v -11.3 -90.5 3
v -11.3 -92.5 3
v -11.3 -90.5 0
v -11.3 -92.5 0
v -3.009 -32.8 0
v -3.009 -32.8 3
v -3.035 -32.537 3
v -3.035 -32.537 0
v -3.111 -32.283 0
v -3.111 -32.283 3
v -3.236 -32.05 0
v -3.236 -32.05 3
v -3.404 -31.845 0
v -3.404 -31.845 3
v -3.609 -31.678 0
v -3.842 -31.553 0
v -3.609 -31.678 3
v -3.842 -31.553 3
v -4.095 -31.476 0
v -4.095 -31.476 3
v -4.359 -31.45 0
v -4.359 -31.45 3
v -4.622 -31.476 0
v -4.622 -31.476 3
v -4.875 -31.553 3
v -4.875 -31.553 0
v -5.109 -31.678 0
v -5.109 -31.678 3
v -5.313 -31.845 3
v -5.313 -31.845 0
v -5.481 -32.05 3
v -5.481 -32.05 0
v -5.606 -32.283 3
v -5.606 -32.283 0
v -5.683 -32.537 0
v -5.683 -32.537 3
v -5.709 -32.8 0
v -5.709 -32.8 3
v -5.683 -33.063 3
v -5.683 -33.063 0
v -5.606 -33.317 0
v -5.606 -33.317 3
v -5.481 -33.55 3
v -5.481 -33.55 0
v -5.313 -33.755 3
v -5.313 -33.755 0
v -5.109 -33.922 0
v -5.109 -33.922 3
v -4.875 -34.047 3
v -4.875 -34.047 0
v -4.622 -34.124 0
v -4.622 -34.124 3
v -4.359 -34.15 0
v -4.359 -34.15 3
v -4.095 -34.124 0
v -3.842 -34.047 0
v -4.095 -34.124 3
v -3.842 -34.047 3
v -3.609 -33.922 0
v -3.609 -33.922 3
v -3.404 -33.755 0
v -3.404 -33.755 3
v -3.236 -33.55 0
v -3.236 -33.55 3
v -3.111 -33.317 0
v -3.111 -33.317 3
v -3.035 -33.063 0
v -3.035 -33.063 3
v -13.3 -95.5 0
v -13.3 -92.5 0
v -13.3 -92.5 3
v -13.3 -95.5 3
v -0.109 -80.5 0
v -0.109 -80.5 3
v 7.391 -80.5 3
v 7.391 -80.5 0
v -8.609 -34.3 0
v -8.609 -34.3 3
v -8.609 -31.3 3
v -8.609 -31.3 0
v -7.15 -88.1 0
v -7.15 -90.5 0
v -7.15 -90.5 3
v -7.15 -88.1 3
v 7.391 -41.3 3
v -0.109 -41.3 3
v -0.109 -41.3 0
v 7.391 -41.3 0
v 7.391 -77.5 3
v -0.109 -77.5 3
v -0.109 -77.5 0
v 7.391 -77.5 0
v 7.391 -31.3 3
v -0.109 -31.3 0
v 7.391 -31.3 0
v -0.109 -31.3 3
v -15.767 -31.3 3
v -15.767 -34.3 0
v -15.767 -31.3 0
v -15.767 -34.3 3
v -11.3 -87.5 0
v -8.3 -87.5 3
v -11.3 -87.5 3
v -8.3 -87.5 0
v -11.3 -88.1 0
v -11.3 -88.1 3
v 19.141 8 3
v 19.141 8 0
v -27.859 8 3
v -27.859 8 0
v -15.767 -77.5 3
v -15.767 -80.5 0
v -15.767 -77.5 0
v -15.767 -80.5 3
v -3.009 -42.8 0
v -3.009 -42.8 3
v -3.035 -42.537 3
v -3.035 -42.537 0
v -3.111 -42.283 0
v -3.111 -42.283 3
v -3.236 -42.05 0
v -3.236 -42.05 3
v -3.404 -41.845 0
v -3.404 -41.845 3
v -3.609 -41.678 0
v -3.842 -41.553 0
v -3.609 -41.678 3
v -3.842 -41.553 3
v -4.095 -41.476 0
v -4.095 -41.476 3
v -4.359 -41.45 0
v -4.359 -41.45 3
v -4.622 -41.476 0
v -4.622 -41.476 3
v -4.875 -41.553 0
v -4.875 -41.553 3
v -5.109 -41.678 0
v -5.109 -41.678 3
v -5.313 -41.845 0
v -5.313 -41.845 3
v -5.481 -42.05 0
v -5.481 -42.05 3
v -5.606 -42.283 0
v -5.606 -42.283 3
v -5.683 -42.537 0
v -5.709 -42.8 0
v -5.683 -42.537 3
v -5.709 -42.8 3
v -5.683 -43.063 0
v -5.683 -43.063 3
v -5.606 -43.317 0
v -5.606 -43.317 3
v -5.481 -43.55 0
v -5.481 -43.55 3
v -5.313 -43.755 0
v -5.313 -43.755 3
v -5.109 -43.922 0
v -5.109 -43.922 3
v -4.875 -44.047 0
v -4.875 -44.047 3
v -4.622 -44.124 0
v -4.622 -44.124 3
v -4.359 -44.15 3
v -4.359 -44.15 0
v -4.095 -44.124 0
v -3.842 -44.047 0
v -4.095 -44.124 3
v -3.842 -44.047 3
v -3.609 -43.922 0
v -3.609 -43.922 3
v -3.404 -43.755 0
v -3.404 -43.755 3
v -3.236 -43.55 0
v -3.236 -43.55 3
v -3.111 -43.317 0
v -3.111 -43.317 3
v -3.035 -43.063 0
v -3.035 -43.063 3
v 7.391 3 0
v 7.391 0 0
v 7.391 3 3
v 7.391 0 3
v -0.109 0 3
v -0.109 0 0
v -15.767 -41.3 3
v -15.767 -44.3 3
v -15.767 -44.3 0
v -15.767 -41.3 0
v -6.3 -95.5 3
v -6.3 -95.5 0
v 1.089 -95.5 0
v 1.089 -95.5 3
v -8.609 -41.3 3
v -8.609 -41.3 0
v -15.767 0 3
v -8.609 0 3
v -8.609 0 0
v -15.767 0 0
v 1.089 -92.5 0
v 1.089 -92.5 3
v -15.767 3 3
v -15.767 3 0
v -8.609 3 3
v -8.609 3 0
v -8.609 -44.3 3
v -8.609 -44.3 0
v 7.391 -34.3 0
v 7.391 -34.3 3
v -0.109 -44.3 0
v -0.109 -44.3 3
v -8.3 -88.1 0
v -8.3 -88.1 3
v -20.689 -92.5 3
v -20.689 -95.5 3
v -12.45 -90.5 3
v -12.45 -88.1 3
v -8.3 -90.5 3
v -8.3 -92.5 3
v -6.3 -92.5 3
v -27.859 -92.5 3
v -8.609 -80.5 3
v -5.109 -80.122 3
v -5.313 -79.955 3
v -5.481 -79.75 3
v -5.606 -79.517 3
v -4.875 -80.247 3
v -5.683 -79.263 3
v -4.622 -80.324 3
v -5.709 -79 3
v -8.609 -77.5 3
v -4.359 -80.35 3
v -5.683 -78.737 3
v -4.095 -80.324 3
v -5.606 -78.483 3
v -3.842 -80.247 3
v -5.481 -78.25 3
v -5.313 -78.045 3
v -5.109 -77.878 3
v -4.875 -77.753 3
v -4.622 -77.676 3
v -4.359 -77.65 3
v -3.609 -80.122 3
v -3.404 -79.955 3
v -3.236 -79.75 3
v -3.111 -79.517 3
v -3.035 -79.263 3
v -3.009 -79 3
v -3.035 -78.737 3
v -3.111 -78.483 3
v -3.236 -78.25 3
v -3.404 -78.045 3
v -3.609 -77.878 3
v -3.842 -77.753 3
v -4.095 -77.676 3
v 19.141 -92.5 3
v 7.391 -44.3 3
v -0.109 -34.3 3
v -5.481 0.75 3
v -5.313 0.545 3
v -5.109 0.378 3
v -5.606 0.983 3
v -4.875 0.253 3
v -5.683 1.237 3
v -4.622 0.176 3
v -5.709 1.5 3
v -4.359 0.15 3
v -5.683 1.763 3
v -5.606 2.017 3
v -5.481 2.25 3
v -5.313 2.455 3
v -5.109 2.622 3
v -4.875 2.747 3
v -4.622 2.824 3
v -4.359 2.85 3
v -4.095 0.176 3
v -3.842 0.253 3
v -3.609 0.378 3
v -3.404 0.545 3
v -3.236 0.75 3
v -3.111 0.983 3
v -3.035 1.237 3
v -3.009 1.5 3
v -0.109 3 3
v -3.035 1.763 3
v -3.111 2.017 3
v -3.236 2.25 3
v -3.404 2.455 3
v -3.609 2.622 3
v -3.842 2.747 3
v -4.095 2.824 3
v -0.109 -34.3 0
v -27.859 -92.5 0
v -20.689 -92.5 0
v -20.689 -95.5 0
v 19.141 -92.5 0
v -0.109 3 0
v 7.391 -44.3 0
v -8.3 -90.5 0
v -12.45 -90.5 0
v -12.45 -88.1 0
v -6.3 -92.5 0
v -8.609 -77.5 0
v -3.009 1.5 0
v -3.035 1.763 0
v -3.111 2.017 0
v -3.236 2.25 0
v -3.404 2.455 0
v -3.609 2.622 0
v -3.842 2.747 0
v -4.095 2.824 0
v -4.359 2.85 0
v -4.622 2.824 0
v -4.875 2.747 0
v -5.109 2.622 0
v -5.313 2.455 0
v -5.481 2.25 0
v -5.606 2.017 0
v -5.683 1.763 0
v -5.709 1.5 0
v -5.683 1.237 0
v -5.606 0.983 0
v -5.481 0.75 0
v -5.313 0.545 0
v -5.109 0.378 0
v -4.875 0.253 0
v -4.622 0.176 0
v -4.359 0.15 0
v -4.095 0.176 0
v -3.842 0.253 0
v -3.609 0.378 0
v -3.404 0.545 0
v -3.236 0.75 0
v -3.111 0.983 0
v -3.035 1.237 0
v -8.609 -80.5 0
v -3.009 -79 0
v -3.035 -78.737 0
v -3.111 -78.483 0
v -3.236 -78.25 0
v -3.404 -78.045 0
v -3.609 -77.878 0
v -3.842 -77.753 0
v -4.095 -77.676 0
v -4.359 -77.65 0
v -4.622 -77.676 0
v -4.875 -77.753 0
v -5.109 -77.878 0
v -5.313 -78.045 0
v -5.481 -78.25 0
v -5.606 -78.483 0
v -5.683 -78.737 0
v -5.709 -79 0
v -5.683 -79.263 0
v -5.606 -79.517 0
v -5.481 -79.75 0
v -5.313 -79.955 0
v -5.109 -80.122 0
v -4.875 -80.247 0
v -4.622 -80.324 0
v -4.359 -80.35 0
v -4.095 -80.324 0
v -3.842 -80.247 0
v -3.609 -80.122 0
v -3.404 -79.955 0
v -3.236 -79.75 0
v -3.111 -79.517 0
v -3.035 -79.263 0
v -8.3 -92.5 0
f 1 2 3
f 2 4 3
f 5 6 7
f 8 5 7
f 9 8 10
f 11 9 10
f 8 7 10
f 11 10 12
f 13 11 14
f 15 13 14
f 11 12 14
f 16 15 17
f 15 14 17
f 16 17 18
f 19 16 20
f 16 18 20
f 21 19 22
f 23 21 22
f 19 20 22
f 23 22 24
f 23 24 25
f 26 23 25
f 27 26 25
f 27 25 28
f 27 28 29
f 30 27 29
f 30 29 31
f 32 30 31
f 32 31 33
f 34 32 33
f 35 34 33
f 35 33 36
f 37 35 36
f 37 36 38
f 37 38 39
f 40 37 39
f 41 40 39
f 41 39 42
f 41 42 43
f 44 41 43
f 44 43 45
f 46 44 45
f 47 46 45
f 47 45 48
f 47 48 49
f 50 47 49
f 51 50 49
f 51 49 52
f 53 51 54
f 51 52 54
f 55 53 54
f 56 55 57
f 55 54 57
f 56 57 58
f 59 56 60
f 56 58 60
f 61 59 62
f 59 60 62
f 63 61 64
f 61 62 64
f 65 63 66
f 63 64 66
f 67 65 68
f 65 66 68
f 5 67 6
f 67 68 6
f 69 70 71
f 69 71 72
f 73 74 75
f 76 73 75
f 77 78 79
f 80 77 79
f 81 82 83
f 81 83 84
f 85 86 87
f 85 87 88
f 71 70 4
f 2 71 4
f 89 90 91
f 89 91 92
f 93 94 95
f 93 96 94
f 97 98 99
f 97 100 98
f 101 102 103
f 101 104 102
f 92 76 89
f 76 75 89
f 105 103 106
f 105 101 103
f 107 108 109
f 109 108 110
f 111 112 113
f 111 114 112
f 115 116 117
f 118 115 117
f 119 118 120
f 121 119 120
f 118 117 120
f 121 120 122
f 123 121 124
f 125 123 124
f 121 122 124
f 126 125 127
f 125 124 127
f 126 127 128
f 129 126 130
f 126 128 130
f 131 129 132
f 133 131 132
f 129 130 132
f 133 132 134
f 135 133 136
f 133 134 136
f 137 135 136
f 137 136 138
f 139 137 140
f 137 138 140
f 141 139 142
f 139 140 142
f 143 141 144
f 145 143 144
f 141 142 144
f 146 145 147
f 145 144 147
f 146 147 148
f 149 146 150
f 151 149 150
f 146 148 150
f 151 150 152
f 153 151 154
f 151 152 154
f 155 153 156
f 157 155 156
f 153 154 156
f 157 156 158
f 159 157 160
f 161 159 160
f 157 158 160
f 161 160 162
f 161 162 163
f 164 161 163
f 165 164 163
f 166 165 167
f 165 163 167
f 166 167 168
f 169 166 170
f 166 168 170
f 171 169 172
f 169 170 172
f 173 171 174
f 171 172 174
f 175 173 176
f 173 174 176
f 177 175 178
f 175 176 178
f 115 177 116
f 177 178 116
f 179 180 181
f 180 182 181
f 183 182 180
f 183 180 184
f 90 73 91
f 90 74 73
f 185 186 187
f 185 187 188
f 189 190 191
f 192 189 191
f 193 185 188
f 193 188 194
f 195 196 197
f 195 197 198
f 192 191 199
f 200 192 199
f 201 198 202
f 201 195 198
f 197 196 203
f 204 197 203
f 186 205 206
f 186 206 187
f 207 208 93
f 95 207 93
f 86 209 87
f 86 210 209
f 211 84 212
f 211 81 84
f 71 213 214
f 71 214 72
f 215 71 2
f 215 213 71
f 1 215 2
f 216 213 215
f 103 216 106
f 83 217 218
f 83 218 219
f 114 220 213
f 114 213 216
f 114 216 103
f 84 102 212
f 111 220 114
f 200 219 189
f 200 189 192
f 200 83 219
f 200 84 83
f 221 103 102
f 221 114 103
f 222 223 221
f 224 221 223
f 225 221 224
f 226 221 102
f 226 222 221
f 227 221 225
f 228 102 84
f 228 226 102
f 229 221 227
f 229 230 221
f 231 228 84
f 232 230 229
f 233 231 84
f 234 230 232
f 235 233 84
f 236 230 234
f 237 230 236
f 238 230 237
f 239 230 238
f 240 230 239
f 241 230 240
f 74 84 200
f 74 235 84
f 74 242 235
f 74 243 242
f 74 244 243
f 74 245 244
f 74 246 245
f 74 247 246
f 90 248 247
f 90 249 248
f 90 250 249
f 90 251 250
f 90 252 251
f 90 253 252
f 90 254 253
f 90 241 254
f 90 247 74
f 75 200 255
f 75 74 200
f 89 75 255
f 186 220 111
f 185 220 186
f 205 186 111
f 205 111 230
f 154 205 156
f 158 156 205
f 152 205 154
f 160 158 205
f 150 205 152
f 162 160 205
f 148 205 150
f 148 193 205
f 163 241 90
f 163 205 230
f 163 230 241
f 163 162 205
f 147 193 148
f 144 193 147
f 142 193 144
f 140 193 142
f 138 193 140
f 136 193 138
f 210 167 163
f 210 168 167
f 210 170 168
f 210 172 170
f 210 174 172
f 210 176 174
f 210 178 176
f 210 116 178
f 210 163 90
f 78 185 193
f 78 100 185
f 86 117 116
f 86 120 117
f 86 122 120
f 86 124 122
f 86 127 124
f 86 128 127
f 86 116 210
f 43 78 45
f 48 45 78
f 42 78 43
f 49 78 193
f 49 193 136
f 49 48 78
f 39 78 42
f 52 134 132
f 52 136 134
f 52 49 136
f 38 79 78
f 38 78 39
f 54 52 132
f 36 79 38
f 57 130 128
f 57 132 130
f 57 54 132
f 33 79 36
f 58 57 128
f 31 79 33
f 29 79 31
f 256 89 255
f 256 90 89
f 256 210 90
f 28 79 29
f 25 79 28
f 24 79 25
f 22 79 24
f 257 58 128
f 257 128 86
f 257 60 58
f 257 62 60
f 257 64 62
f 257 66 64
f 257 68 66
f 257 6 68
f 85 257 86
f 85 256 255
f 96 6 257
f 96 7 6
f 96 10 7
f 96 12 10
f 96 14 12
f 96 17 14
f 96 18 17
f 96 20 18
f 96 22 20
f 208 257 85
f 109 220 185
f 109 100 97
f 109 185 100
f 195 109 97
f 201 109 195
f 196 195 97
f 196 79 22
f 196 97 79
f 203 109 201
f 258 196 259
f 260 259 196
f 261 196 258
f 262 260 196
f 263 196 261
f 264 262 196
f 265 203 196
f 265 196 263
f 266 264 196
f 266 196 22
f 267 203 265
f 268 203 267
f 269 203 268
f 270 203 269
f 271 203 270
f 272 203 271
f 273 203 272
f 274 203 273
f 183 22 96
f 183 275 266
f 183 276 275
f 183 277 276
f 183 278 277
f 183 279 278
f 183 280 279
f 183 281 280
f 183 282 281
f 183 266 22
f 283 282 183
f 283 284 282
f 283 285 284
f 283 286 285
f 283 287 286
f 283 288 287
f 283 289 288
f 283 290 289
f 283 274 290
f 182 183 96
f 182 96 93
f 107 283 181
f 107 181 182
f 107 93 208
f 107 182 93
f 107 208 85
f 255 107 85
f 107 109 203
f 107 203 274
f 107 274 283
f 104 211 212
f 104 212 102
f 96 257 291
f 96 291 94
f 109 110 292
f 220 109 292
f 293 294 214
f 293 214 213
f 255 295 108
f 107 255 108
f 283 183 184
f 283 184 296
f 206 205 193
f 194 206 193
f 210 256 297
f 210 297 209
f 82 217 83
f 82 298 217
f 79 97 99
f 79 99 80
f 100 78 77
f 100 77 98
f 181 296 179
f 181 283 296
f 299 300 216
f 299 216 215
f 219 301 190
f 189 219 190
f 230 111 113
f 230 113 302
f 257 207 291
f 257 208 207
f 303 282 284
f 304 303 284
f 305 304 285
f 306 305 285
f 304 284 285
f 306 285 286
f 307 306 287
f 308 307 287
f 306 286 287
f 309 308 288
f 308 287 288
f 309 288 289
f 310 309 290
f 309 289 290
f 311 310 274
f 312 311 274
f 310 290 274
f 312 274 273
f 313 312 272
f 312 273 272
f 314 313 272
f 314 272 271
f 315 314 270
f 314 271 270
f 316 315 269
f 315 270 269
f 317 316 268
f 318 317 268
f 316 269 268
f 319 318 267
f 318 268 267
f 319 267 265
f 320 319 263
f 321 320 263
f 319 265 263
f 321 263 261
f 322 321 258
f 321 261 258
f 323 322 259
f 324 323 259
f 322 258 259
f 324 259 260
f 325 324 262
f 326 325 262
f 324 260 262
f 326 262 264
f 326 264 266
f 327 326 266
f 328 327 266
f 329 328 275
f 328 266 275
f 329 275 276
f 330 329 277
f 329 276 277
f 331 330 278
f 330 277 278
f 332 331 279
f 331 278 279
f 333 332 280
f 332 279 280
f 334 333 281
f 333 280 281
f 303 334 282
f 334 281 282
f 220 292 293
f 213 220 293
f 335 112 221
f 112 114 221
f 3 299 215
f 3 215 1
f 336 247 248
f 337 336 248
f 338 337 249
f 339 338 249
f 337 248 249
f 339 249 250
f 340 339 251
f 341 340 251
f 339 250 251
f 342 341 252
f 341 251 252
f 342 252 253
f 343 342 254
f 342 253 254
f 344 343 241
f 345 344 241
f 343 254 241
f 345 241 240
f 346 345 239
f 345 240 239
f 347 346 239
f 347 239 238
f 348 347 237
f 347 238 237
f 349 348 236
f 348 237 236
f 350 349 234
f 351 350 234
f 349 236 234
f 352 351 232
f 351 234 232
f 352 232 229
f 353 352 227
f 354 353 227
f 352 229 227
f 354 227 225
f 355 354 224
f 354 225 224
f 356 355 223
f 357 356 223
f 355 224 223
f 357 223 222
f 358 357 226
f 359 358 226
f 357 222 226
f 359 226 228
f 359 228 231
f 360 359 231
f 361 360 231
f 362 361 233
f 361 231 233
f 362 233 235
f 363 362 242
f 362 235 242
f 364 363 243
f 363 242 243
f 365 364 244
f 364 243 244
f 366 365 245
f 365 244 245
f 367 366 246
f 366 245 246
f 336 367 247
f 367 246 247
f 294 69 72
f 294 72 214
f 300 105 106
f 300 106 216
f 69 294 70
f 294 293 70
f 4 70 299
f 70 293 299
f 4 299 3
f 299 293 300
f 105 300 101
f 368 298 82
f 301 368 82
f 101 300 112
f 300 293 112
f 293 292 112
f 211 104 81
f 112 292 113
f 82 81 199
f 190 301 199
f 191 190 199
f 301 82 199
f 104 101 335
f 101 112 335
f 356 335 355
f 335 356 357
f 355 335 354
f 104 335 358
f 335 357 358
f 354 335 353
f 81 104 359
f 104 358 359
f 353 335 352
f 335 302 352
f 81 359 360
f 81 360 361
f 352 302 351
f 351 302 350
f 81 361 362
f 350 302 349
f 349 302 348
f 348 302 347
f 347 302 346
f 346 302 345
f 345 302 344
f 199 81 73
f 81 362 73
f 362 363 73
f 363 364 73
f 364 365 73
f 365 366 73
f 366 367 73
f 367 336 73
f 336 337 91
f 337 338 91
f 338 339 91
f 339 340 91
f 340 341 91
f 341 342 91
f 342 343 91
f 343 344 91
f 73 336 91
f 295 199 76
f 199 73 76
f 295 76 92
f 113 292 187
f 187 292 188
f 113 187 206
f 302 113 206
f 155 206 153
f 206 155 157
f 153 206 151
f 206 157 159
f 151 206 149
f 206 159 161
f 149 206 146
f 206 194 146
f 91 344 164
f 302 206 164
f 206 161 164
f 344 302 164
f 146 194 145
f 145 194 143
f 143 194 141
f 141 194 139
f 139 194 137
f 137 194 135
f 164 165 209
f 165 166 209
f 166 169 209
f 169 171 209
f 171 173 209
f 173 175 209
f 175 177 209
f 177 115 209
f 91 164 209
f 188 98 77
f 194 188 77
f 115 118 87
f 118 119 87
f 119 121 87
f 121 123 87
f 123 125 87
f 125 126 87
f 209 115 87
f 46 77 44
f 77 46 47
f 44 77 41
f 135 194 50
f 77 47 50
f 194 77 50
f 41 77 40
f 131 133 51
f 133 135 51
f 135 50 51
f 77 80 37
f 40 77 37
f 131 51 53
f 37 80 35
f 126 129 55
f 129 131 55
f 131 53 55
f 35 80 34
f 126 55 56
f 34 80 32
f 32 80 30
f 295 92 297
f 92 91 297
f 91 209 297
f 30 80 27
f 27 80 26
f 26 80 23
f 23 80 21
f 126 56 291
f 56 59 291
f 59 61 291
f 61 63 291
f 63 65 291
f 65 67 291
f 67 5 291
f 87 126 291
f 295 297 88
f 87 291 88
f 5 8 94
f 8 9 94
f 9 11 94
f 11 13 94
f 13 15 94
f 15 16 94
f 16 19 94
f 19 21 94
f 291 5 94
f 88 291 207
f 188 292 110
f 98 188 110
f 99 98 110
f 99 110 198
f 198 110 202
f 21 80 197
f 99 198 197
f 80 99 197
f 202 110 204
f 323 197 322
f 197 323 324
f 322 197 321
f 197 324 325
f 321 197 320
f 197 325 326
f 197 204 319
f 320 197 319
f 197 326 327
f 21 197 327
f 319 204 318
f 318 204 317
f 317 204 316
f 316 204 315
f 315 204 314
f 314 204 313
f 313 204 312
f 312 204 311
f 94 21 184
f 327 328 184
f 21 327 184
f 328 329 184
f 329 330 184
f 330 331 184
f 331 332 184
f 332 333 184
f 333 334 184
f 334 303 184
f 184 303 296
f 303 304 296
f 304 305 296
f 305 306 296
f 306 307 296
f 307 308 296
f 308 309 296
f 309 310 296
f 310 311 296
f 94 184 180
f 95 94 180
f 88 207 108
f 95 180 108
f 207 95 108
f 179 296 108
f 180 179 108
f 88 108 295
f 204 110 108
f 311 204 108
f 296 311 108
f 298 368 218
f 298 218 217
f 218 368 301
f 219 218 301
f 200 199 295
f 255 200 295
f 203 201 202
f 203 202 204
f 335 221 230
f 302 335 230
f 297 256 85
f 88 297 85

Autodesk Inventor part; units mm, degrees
ref_plane "YZ Plane" through (0, 0, 0) normal (1, 0, 0) x (0, 1, 0)
ref_plane "XZ Plane" through (0, 0, 0) normal (0, 1, 0) x (-1, 0, 0)
ref_plane "XY Plane" through (0, 0, 0) normal (0, 0, 1) x (1, 0, 0)
sketch "Sketch1" plane through (0, 0, 0) normal (0, 0, 1) x (1, 0, 0)
  line L0 (19.1414, -92.5) -> (-27.8586, -92.5) construction
  line L1 (0, 3) -> (19.1414, 3) construction
  line L2 (6.5333, -102.5) -> (6.5333, -92.5) construction
  line L3 (-26.1333, -92.5) -> (-26.1333, -102.5) construction
  line L4 (-26.1333, -92.5) -> (-20.6889, -92.5)
  line L5 (19.1414, 3) -> (-27.8586, 3)
  line L6 (-27.8586, 3) -> (-27.8586, -92.5)
  line L7 (-27.8586, -92.5) -> (-20.6889, -92.5)
  line L8 (19.1414, -92.5) -> (19.1414, 3)
  line L9 (-27.8586, 3) -> (19.1414, 3)
  line L10 (19.1414, 3) -> (19.1414, 8)
  line L11 (19.1414, 8) -> (-27.8586, 8)
  line L12 (-27.8586, 8) -> (-27.8586, 3)
  line L13 (-6.3, -92.5) -> (-6.3, -95.5)
  line L14 (-6.3, -95.5) -> (1.0889, -95.5)
  line L15 (1.0889, -95.5) -> (1.0889, -92.5)
  line L16 (-13.3, -92.5) -> (-13.3, -95.5)
  line L17 (-13.3, -95.5) -> (-20.6889, -95.5)
  line L18 (-20.6889, -95.5) -> (-20.6889, -92.5)
  line L19 (-8.3, -92.5) -> (-8.3, -90.5)
  line L20 (-8.3, -90.5) -> (-7.15, -90.5)
  line L21 (-7.15, -90.5) -> (-7.15, -88.1)
  line L22 (-7.15, -88.1) -> (-8.3, -88.1)
  line L23 (-8.3, -88.1) -> (-8.3, -87.5)
  line L24 (-8.3, -87.5) -> (-11.3, -87.5)
  line L25 (-11.3, -87.5) -> (-11.3, -88.1)
  line L26 (-11.3, -88.1) -> (-12.45, -88.1)
  line L27 (-12.45, -88.1) -> (-12.45, -90.5)
  line L28 (-12.45, -90.5) -> (-11.3, -90.5)
  line L29 (-11.3, -92.5) -> (-11.3, -90.5)
  line L30 (-8.3, -92.5) -> (-6.3, -92.5)
  line L31 (-13.3, -92.5) -> (-11.3, -92.5)
  line L32 (-9.8, -83.4221) -> (-9.8, -94.6081) construction
  line L33 (-13.3, -92.5) -> (-11.3, -92.5)
  line L34 (1.0889, -92.5) -> (19.1414, -92.5)
  dimension "d4" = 5
  dimension "d13" = 5.3
  dimension "d14" = 2.4
  dimension "d15" = 3
  dimension "d16" = 32.6667
  dimension "d18" = 5.4444
  dimension "d19" = 5.4444
  dimension "d20" = 21.7778
  dimension "d21" = 7
  dimension "d22" = 3
  dimension "d23" = 5
  dimension "d24" = 8
extrude "Extrusion1" add sketch "Sketch1" along normal blind 3
sketch "Sketch2" plane through (0, 0, 3) normal (0, 0, 1) x (1, 0, 0)
  line L0 (7.3914, 0) -> (-0.1086, 0) projected
  line L1 (7.3914, 0) -> (7.3914, 3) projected
  line L2 (-0.1086, 3) -> (7.3914, 3) projected
  line L3 (-0.1086, 0) -> (-0.1086, 3) projected
  line L4 (-8.6086, 0) -> (-15.7666, 0) projected
  line L5 (-8.6086, 0) -> (-8.6086, 3) projected
  line L6 (-15.7666, 3) -> (-8.6086, 3) projected
  line L7 (7.3914, -34.3) -> (-0.1086, -34.3) projected
  line L8 (7.3914, -34.3) -> (7.3914, -31.3) projected
  line L9 (-0.1086, -31.3) -> (7.3914, -31.3) projected
  line L10 (-0.1086, -34.3) -> (-0.1086, -31.3) projected
  line L11 (-8.6086, -34.3) -> (-15.7666, -34.3) projected
  line L12 (-8.6086, -34.3) -> (-8.6086, -31.3) projected
  line L13 (-15.7666, -31.3) -> (-8.6086, -31.3) projected
  line L14 (7.3914, -44.3) -> (-0.1086, -44.3) projected
  line L15 (7.3914, -44.3) -> (7.3914, -41.3) projected
  line L16 (-0.1086, -41.3) -> (7.3914, -41.3) projected
  line L17 (-0.1086, -44.3) -> (-0.1086, -41.3) projected
  line L18 (-8.6086, -44.3) -> (-15.7666, -44.3) projected
  line L19 (-8.6086, -44.3) -> (-8.6086, -41.3) projected
  line L20 (-15.7666, -41.3) -> (-8.6086, -41.3) projected
  line L21 (-0.1086, -80.5) -> (7.3914, -80.5) projected
  line L22 (7.3914, -80.5) -> (7.3914, -77.5) projected
  line L23 (-0.1086, -77.5) -> (7.3914, -77.5) projected
  line L24 (-0.1086, -80.5) -> (-0.1086, -77.5) projected
  line L25 (-15.7666, -80.5) -> (-8.6086, -80.5) projected
  line L26 (-8.6086, -80.5) -> (-8.6086, -77.5) projected
  line L27 (-15.7666, -77.5) -> (-8.6086, -77.5) projected
  line L28 (-15.7666, -80.5) -> (-15.7666, -77.5) projected
  line L29 (-0.1086, 0) -> (-8.6086, 3) construction
  line L30 (-8.6086, 0) -> (-0.1086, 3) construction
  line L31 (-8.6086, -34.3) -> (-0.1086, -31.3) construction
  line L32 (-0.1086, -34.3) -> (-8.6086, -31.3) construction
  line L33 (-8.6086, -44.3) -> (-0.1086, -41.3) construction
  line L34 (-0.1086, -44.3) -> (-8.6086, -41.3) construction
  circle A0 centre (-4.3586, 1.5) radius 1.35
  circle A1 centre (-4.3586, -32.8) radius 1.35
  circle A2 centre (-4.3586, -42.8) radius 1.35
  line L35 (-0.1086, -77.5) -> (-8.6086, -80.5) construction
  line L36 (-8.6086, -77.5) -> (-0.1086, -80.5) construction
  circle A3 centre (-4.3586, -79) radius 1.35
  line L37 (-15.7666, 0) -> (-15.7666, 3) projected
  line L38 (-15.7666, -44.3) -> (-15.7666, -41.3) projected
  line L39 (-15.7666, -34.3) -> (-15.7666, -31.3) projected
  point P0 (0, 0)
  dimension "d5" = 2.7
  dimension "d6" = 2.7
  dimension "d7" = 2.7
  dimension "d8" = 2.7
extrude "Extrusion2" cut sketch "Sketch2" against normal blind 3
equation "\"d18\" = 0.166667 * d16"
equation "\"d19\" = d18"
